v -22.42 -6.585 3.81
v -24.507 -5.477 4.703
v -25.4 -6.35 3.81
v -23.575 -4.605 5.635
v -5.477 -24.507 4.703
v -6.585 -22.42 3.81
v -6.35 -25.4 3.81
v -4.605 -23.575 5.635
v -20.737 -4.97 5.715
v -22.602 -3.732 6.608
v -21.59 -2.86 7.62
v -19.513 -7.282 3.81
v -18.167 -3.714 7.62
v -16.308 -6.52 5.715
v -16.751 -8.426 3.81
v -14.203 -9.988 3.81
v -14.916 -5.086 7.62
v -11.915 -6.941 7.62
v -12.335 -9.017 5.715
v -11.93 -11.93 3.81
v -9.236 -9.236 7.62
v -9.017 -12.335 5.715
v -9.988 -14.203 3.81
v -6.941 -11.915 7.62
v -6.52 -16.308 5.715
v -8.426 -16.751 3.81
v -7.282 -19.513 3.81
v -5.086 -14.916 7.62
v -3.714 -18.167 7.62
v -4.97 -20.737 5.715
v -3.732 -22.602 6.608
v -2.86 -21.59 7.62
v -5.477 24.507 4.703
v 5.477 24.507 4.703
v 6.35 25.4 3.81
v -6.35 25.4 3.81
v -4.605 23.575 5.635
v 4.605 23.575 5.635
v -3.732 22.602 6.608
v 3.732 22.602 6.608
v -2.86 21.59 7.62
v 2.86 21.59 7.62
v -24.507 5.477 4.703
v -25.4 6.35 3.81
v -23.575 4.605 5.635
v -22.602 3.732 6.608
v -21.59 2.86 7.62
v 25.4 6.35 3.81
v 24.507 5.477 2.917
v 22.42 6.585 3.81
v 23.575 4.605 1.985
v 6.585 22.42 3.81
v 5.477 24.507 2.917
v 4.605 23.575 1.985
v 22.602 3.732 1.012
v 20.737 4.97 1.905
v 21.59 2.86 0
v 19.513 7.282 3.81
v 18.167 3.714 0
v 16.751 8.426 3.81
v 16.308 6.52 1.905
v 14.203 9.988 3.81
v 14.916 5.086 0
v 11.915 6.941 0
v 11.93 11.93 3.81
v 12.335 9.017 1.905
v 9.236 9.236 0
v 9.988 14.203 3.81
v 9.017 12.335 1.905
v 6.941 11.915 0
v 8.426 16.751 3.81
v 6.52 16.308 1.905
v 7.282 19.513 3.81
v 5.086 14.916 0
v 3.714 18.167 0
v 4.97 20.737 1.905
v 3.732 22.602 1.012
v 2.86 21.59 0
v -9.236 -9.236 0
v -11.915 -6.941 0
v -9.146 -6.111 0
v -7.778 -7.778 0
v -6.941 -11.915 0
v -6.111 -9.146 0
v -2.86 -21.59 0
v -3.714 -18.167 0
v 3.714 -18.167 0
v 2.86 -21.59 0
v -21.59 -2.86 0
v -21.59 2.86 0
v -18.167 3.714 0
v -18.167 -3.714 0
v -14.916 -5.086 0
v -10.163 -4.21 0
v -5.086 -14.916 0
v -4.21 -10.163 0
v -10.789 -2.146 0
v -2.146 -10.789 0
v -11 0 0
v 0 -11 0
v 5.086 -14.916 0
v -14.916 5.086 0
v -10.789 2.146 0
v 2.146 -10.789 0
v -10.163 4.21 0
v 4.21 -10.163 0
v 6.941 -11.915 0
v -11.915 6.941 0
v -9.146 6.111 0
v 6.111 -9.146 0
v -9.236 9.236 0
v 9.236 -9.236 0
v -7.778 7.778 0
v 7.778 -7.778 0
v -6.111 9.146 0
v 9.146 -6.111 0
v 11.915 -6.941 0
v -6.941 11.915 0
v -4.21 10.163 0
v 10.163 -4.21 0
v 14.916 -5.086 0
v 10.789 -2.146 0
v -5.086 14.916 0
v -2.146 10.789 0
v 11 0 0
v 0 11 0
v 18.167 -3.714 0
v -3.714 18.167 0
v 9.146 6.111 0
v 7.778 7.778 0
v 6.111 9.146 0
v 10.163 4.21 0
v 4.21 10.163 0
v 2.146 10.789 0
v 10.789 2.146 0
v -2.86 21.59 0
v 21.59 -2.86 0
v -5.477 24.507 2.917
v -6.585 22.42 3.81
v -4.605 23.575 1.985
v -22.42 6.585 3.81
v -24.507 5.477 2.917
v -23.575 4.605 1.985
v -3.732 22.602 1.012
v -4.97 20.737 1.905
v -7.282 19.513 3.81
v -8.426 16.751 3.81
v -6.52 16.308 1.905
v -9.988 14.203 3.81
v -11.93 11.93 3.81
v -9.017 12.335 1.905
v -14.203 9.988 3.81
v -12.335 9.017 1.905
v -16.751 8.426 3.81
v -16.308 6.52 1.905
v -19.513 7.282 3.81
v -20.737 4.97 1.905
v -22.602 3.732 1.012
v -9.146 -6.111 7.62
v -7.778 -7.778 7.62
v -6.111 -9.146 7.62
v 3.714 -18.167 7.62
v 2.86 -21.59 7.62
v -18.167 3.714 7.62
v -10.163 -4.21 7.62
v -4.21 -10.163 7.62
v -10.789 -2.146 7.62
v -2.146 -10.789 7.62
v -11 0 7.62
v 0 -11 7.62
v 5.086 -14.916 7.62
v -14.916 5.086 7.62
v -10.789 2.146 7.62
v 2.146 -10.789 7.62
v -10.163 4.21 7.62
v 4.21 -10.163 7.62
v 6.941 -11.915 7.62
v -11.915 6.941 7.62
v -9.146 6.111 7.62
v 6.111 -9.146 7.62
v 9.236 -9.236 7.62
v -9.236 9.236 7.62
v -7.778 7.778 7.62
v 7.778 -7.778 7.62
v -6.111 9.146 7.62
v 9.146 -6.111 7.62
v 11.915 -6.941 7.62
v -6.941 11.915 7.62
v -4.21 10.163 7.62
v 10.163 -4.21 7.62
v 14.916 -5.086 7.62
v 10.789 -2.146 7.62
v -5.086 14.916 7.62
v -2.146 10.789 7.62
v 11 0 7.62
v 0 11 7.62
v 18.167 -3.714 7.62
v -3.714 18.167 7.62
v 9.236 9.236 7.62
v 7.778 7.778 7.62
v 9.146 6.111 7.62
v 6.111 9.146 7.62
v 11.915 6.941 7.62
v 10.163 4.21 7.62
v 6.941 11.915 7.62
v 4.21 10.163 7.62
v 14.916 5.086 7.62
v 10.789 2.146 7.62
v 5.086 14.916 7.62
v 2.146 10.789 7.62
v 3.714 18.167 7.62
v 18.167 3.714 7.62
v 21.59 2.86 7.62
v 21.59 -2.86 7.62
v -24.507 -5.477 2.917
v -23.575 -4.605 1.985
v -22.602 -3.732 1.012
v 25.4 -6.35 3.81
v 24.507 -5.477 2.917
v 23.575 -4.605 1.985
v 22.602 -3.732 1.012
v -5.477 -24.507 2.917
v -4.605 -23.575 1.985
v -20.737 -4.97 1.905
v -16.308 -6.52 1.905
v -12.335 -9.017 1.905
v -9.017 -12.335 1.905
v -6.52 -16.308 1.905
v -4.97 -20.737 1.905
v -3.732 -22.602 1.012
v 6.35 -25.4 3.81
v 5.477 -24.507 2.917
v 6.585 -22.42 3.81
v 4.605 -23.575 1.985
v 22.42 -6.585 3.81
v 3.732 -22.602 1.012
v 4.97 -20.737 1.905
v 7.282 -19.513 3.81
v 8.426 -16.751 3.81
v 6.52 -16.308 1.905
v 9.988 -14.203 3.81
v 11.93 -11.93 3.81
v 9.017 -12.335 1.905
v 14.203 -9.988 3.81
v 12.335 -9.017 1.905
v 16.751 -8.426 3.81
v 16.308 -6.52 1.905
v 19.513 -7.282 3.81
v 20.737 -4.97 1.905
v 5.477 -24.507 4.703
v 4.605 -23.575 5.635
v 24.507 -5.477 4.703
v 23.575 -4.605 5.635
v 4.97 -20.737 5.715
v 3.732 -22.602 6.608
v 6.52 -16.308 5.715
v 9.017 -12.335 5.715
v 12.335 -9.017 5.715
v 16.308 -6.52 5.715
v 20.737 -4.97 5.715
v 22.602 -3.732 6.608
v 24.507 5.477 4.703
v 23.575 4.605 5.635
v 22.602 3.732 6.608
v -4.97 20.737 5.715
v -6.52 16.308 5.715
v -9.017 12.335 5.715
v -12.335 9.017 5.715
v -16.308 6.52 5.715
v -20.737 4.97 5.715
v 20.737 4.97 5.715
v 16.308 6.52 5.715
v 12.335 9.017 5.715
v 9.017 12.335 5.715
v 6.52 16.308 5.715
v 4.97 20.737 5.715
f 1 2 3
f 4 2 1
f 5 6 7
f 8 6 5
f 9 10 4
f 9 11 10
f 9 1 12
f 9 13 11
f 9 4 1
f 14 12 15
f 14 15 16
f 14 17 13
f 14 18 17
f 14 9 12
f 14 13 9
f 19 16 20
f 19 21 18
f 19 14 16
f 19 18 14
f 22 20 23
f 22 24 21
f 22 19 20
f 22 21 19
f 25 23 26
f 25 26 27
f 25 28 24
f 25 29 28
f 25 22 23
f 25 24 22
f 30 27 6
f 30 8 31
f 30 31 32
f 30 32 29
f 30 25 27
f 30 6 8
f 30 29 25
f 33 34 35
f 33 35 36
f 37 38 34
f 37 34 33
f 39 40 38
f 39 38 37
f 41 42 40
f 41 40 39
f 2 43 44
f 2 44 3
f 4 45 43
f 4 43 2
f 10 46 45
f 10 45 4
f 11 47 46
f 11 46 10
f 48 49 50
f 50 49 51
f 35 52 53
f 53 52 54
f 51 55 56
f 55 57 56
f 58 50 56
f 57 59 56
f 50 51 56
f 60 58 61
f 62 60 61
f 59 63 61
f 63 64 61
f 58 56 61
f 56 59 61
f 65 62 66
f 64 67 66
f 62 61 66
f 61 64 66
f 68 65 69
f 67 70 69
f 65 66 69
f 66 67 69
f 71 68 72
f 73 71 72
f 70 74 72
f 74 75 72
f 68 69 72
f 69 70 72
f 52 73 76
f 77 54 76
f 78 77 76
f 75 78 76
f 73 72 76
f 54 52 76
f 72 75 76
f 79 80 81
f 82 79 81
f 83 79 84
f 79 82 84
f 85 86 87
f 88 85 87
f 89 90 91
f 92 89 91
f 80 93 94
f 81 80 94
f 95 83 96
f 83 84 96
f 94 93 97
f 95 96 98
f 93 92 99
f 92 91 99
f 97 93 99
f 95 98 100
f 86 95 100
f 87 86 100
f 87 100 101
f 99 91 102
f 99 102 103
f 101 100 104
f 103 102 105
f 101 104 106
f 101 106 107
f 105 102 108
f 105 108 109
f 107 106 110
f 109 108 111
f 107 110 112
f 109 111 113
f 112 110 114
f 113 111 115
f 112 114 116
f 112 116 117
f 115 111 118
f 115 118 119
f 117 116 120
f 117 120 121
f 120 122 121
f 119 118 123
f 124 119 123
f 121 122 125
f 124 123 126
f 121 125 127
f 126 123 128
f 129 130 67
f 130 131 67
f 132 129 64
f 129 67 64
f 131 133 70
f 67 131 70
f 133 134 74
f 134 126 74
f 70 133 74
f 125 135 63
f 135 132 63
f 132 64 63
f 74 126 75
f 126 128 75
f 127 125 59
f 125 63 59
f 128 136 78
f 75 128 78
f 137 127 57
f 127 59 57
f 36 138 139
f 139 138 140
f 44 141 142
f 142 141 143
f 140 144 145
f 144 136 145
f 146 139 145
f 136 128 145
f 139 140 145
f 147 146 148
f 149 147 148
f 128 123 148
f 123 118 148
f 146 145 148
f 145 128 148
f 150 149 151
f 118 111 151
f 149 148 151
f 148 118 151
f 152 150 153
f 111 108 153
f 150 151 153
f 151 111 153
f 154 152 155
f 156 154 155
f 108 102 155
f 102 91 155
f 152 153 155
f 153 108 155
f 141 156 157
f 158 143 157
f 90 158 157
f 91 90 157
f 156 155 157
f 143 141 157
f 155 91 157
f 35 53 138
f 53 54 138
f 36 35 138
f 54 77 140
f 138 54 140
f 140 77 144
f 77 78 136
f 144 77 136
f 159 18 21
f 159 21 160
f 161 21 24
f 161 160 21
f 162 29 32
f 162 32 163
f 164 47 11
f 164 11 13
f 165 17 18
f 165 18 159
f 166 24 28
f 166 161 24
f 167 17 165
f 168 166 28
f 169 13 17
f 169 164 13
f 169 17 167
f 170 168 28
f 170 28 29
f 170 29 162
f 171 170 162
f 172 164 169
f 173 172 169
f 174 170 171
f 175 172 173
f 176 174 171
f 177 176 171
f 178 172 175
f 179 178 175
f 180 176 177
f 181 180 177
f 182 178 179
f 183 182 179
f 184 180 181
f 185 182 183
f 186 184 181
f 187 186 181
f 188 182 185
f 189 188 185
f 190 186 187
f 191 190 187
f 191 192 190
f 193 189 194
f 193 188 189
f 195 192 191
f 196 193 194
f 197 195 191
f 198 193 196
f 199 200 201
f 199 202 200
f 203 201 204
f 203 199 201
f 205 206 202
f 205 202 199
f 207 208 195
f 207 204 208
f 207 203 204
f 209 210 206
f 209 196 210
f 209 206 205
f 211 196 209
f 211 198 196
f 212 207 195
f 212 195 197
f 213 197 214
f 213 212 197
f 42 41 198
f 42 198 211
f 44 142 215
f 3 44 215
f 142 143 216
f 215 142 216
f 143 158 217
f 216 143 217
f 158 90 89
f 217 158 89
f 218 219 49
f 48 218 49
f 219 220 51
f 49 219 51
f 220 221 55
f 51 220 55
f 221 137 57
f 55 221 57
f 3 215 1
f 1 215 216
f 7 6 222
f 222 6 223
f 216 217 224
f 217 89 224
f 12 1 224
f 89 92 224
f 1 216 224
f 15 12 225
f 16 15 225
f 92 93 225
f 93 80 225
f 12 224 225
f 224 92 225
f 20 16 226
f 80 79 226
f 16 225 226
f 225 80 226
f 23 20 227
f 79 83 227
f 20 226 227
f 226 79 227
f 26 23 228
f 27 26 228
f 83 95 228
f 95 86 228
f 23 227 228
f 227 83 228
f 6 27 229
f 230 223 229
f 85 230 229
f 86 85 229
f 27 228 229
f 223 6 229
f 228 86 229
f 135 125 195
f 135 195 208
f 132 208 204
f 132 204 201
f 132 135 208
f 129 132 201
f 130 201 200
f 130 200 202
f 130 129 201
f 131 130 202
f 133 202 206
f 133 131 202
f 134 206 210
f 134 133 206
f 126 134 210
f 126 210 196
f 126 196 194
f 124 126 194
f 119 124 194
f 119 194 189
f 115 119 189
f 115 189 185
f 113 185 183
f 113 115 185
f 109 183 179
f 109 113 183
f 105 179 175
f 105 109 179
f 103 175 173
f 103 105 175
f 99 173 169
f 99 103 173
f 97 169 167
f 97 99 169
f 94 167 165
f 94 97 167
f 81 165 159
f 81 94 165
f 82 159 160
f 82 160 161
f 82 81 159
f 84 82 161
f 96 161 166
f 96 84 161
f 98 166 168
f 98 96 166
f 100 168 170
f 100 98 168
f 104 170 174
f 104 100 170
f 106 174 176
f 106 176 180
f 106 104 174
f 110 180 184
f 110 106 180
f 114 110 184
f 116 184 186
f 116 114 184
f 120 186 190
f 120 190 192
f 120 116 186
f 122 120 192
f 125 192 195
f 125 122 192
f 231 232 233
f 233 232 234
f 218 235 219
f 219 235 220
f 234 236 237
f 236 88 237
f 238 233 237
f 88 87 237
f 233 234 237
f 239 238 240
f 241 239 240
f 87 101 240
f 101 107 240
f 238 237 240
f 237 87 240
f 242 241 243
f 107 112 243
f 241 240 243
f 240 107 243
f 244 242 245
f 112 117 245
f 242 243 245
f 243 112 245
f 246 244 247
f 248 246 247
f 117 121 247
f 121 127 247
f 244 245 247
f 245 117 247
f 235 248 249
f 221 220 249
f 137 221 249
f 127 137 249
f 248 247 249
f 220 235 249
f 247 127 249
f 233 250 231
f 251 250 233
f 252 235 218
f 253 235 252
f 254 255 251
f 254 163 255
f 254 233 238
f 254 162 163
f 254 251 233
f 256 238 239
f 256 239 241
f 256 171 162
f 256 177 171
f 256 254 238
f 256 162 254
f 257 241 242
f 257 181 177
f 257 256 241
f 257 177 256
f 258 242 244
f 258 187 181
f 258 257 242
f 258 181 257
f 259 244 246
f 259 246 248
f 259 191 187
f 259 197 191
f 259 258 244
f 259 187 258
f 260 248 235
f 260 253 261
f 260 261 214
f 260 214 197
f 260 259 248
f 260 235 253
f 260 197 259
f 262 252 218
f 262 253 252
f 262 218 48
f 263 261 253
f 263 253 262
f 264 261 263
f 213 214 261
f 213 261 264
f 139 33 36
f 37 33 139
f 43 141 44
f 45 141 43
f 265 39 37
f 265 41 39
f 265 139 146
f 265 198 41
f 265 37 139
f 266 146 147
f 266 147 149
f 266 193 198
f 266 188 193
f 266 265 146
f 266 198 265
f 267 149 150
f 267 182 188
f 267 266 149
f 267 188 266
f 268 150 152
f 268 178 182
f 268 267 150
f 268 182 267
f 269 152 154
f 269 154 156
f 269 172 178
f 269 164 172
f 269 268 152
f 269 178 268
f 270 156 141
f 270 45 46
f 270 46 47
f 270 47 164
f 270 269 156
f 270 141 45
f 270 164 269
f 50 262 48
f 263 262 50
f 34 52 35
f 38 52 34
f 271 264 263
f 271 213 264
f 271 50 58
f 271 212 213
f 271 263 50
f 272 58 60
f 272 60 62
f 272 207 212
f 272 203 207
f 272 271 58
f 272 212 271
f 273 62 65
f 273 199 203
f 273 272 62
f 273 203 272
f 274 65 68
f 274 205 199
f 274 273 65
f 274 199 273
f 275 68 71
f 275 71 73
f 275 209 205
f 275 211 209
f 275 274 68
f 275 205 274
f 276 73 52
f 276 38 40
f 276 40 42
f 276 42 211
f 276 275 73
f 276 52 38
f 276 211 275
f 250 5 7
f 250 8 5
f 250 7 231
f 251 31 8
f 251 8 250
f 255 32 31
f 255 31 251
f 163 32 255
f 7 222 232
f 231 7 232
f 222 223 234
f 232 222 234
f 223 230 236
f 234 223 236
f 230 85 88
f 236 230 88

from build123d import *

# Parameters (mm, degrees)
F0_R     = 11
F1_DEPTH = 7.62
F2_SIZE  = 3.80999


# Not quite as in the source:
# - a fillet or chamfer is up to 0.001 mm smaller than in the source, because OpenCascade refuses the exact size


with BuildPart() as f1:
    # F0 (on Top) → F1 (new body)
    with BuildSketch(Plane.XY):
        with BuildLine():
            Line((6.35, 25.4), (-6.35, 25.4))
            ThreePointArc((-6.35, 25.4), (-11.9296158184, 11.9296158184), (-25.4, 6.35))
            Line((-25.4, 6.35), (-25.4, -6.35))
            ThreePointArc((-25.4, -6.35), (-11.9296158184, -11.9296158184), (-6.35, -25.4))
            Line((-6.35, -25.4), (6.35, -25.4))
            ThreePointArc((6.35, -25.4), (11.9296158184, -11.9296158184), (25.4, -6.35))
            Line((25.4, -6.35), (25.4, 6.35))
            ThreePointArc((25.4, 6.35), (11.9296158184, 11.9296158184), (6.35, 25.4))
        make_face()
        Circle(F0_R, mode=Mode.SUBTRACT)
    extrude(amount=F1_DEPTH)

    # F2 (size 3.81 in the source; OpenCascade refuses exactly that, so slightly less here)
    f2_edges = [f1.edges().sort_by_distance(p)[0] for p in [
        (11.929616, 11.929616, 7.62),
        (-11.929616, 11.929616, 7.62),
        (0, 25.4, 7.62),
        (25.4, 0, 7.62),
        (11.929616, -11.929616, 7.62),
        (0, -25.4, 7.62),
        (-11.929616, -11.929616, 7.62),
        (-25.4, 0, 7.62),
        (-11.929616, 11.929616, 0),
        (0, 25.4, 0),
        (11.929616, 11.929616, 0),
        (11.929616, -11.929616, 0),
        (25.4, 0, 0),
        (-11.929616, -11.929616, 0),
        (0, -25.4, 0),
        (-25.4, 0, 0),
    ]]
    chamfer(f2_edges, length=F2_SIZE)


solid = f1.part
